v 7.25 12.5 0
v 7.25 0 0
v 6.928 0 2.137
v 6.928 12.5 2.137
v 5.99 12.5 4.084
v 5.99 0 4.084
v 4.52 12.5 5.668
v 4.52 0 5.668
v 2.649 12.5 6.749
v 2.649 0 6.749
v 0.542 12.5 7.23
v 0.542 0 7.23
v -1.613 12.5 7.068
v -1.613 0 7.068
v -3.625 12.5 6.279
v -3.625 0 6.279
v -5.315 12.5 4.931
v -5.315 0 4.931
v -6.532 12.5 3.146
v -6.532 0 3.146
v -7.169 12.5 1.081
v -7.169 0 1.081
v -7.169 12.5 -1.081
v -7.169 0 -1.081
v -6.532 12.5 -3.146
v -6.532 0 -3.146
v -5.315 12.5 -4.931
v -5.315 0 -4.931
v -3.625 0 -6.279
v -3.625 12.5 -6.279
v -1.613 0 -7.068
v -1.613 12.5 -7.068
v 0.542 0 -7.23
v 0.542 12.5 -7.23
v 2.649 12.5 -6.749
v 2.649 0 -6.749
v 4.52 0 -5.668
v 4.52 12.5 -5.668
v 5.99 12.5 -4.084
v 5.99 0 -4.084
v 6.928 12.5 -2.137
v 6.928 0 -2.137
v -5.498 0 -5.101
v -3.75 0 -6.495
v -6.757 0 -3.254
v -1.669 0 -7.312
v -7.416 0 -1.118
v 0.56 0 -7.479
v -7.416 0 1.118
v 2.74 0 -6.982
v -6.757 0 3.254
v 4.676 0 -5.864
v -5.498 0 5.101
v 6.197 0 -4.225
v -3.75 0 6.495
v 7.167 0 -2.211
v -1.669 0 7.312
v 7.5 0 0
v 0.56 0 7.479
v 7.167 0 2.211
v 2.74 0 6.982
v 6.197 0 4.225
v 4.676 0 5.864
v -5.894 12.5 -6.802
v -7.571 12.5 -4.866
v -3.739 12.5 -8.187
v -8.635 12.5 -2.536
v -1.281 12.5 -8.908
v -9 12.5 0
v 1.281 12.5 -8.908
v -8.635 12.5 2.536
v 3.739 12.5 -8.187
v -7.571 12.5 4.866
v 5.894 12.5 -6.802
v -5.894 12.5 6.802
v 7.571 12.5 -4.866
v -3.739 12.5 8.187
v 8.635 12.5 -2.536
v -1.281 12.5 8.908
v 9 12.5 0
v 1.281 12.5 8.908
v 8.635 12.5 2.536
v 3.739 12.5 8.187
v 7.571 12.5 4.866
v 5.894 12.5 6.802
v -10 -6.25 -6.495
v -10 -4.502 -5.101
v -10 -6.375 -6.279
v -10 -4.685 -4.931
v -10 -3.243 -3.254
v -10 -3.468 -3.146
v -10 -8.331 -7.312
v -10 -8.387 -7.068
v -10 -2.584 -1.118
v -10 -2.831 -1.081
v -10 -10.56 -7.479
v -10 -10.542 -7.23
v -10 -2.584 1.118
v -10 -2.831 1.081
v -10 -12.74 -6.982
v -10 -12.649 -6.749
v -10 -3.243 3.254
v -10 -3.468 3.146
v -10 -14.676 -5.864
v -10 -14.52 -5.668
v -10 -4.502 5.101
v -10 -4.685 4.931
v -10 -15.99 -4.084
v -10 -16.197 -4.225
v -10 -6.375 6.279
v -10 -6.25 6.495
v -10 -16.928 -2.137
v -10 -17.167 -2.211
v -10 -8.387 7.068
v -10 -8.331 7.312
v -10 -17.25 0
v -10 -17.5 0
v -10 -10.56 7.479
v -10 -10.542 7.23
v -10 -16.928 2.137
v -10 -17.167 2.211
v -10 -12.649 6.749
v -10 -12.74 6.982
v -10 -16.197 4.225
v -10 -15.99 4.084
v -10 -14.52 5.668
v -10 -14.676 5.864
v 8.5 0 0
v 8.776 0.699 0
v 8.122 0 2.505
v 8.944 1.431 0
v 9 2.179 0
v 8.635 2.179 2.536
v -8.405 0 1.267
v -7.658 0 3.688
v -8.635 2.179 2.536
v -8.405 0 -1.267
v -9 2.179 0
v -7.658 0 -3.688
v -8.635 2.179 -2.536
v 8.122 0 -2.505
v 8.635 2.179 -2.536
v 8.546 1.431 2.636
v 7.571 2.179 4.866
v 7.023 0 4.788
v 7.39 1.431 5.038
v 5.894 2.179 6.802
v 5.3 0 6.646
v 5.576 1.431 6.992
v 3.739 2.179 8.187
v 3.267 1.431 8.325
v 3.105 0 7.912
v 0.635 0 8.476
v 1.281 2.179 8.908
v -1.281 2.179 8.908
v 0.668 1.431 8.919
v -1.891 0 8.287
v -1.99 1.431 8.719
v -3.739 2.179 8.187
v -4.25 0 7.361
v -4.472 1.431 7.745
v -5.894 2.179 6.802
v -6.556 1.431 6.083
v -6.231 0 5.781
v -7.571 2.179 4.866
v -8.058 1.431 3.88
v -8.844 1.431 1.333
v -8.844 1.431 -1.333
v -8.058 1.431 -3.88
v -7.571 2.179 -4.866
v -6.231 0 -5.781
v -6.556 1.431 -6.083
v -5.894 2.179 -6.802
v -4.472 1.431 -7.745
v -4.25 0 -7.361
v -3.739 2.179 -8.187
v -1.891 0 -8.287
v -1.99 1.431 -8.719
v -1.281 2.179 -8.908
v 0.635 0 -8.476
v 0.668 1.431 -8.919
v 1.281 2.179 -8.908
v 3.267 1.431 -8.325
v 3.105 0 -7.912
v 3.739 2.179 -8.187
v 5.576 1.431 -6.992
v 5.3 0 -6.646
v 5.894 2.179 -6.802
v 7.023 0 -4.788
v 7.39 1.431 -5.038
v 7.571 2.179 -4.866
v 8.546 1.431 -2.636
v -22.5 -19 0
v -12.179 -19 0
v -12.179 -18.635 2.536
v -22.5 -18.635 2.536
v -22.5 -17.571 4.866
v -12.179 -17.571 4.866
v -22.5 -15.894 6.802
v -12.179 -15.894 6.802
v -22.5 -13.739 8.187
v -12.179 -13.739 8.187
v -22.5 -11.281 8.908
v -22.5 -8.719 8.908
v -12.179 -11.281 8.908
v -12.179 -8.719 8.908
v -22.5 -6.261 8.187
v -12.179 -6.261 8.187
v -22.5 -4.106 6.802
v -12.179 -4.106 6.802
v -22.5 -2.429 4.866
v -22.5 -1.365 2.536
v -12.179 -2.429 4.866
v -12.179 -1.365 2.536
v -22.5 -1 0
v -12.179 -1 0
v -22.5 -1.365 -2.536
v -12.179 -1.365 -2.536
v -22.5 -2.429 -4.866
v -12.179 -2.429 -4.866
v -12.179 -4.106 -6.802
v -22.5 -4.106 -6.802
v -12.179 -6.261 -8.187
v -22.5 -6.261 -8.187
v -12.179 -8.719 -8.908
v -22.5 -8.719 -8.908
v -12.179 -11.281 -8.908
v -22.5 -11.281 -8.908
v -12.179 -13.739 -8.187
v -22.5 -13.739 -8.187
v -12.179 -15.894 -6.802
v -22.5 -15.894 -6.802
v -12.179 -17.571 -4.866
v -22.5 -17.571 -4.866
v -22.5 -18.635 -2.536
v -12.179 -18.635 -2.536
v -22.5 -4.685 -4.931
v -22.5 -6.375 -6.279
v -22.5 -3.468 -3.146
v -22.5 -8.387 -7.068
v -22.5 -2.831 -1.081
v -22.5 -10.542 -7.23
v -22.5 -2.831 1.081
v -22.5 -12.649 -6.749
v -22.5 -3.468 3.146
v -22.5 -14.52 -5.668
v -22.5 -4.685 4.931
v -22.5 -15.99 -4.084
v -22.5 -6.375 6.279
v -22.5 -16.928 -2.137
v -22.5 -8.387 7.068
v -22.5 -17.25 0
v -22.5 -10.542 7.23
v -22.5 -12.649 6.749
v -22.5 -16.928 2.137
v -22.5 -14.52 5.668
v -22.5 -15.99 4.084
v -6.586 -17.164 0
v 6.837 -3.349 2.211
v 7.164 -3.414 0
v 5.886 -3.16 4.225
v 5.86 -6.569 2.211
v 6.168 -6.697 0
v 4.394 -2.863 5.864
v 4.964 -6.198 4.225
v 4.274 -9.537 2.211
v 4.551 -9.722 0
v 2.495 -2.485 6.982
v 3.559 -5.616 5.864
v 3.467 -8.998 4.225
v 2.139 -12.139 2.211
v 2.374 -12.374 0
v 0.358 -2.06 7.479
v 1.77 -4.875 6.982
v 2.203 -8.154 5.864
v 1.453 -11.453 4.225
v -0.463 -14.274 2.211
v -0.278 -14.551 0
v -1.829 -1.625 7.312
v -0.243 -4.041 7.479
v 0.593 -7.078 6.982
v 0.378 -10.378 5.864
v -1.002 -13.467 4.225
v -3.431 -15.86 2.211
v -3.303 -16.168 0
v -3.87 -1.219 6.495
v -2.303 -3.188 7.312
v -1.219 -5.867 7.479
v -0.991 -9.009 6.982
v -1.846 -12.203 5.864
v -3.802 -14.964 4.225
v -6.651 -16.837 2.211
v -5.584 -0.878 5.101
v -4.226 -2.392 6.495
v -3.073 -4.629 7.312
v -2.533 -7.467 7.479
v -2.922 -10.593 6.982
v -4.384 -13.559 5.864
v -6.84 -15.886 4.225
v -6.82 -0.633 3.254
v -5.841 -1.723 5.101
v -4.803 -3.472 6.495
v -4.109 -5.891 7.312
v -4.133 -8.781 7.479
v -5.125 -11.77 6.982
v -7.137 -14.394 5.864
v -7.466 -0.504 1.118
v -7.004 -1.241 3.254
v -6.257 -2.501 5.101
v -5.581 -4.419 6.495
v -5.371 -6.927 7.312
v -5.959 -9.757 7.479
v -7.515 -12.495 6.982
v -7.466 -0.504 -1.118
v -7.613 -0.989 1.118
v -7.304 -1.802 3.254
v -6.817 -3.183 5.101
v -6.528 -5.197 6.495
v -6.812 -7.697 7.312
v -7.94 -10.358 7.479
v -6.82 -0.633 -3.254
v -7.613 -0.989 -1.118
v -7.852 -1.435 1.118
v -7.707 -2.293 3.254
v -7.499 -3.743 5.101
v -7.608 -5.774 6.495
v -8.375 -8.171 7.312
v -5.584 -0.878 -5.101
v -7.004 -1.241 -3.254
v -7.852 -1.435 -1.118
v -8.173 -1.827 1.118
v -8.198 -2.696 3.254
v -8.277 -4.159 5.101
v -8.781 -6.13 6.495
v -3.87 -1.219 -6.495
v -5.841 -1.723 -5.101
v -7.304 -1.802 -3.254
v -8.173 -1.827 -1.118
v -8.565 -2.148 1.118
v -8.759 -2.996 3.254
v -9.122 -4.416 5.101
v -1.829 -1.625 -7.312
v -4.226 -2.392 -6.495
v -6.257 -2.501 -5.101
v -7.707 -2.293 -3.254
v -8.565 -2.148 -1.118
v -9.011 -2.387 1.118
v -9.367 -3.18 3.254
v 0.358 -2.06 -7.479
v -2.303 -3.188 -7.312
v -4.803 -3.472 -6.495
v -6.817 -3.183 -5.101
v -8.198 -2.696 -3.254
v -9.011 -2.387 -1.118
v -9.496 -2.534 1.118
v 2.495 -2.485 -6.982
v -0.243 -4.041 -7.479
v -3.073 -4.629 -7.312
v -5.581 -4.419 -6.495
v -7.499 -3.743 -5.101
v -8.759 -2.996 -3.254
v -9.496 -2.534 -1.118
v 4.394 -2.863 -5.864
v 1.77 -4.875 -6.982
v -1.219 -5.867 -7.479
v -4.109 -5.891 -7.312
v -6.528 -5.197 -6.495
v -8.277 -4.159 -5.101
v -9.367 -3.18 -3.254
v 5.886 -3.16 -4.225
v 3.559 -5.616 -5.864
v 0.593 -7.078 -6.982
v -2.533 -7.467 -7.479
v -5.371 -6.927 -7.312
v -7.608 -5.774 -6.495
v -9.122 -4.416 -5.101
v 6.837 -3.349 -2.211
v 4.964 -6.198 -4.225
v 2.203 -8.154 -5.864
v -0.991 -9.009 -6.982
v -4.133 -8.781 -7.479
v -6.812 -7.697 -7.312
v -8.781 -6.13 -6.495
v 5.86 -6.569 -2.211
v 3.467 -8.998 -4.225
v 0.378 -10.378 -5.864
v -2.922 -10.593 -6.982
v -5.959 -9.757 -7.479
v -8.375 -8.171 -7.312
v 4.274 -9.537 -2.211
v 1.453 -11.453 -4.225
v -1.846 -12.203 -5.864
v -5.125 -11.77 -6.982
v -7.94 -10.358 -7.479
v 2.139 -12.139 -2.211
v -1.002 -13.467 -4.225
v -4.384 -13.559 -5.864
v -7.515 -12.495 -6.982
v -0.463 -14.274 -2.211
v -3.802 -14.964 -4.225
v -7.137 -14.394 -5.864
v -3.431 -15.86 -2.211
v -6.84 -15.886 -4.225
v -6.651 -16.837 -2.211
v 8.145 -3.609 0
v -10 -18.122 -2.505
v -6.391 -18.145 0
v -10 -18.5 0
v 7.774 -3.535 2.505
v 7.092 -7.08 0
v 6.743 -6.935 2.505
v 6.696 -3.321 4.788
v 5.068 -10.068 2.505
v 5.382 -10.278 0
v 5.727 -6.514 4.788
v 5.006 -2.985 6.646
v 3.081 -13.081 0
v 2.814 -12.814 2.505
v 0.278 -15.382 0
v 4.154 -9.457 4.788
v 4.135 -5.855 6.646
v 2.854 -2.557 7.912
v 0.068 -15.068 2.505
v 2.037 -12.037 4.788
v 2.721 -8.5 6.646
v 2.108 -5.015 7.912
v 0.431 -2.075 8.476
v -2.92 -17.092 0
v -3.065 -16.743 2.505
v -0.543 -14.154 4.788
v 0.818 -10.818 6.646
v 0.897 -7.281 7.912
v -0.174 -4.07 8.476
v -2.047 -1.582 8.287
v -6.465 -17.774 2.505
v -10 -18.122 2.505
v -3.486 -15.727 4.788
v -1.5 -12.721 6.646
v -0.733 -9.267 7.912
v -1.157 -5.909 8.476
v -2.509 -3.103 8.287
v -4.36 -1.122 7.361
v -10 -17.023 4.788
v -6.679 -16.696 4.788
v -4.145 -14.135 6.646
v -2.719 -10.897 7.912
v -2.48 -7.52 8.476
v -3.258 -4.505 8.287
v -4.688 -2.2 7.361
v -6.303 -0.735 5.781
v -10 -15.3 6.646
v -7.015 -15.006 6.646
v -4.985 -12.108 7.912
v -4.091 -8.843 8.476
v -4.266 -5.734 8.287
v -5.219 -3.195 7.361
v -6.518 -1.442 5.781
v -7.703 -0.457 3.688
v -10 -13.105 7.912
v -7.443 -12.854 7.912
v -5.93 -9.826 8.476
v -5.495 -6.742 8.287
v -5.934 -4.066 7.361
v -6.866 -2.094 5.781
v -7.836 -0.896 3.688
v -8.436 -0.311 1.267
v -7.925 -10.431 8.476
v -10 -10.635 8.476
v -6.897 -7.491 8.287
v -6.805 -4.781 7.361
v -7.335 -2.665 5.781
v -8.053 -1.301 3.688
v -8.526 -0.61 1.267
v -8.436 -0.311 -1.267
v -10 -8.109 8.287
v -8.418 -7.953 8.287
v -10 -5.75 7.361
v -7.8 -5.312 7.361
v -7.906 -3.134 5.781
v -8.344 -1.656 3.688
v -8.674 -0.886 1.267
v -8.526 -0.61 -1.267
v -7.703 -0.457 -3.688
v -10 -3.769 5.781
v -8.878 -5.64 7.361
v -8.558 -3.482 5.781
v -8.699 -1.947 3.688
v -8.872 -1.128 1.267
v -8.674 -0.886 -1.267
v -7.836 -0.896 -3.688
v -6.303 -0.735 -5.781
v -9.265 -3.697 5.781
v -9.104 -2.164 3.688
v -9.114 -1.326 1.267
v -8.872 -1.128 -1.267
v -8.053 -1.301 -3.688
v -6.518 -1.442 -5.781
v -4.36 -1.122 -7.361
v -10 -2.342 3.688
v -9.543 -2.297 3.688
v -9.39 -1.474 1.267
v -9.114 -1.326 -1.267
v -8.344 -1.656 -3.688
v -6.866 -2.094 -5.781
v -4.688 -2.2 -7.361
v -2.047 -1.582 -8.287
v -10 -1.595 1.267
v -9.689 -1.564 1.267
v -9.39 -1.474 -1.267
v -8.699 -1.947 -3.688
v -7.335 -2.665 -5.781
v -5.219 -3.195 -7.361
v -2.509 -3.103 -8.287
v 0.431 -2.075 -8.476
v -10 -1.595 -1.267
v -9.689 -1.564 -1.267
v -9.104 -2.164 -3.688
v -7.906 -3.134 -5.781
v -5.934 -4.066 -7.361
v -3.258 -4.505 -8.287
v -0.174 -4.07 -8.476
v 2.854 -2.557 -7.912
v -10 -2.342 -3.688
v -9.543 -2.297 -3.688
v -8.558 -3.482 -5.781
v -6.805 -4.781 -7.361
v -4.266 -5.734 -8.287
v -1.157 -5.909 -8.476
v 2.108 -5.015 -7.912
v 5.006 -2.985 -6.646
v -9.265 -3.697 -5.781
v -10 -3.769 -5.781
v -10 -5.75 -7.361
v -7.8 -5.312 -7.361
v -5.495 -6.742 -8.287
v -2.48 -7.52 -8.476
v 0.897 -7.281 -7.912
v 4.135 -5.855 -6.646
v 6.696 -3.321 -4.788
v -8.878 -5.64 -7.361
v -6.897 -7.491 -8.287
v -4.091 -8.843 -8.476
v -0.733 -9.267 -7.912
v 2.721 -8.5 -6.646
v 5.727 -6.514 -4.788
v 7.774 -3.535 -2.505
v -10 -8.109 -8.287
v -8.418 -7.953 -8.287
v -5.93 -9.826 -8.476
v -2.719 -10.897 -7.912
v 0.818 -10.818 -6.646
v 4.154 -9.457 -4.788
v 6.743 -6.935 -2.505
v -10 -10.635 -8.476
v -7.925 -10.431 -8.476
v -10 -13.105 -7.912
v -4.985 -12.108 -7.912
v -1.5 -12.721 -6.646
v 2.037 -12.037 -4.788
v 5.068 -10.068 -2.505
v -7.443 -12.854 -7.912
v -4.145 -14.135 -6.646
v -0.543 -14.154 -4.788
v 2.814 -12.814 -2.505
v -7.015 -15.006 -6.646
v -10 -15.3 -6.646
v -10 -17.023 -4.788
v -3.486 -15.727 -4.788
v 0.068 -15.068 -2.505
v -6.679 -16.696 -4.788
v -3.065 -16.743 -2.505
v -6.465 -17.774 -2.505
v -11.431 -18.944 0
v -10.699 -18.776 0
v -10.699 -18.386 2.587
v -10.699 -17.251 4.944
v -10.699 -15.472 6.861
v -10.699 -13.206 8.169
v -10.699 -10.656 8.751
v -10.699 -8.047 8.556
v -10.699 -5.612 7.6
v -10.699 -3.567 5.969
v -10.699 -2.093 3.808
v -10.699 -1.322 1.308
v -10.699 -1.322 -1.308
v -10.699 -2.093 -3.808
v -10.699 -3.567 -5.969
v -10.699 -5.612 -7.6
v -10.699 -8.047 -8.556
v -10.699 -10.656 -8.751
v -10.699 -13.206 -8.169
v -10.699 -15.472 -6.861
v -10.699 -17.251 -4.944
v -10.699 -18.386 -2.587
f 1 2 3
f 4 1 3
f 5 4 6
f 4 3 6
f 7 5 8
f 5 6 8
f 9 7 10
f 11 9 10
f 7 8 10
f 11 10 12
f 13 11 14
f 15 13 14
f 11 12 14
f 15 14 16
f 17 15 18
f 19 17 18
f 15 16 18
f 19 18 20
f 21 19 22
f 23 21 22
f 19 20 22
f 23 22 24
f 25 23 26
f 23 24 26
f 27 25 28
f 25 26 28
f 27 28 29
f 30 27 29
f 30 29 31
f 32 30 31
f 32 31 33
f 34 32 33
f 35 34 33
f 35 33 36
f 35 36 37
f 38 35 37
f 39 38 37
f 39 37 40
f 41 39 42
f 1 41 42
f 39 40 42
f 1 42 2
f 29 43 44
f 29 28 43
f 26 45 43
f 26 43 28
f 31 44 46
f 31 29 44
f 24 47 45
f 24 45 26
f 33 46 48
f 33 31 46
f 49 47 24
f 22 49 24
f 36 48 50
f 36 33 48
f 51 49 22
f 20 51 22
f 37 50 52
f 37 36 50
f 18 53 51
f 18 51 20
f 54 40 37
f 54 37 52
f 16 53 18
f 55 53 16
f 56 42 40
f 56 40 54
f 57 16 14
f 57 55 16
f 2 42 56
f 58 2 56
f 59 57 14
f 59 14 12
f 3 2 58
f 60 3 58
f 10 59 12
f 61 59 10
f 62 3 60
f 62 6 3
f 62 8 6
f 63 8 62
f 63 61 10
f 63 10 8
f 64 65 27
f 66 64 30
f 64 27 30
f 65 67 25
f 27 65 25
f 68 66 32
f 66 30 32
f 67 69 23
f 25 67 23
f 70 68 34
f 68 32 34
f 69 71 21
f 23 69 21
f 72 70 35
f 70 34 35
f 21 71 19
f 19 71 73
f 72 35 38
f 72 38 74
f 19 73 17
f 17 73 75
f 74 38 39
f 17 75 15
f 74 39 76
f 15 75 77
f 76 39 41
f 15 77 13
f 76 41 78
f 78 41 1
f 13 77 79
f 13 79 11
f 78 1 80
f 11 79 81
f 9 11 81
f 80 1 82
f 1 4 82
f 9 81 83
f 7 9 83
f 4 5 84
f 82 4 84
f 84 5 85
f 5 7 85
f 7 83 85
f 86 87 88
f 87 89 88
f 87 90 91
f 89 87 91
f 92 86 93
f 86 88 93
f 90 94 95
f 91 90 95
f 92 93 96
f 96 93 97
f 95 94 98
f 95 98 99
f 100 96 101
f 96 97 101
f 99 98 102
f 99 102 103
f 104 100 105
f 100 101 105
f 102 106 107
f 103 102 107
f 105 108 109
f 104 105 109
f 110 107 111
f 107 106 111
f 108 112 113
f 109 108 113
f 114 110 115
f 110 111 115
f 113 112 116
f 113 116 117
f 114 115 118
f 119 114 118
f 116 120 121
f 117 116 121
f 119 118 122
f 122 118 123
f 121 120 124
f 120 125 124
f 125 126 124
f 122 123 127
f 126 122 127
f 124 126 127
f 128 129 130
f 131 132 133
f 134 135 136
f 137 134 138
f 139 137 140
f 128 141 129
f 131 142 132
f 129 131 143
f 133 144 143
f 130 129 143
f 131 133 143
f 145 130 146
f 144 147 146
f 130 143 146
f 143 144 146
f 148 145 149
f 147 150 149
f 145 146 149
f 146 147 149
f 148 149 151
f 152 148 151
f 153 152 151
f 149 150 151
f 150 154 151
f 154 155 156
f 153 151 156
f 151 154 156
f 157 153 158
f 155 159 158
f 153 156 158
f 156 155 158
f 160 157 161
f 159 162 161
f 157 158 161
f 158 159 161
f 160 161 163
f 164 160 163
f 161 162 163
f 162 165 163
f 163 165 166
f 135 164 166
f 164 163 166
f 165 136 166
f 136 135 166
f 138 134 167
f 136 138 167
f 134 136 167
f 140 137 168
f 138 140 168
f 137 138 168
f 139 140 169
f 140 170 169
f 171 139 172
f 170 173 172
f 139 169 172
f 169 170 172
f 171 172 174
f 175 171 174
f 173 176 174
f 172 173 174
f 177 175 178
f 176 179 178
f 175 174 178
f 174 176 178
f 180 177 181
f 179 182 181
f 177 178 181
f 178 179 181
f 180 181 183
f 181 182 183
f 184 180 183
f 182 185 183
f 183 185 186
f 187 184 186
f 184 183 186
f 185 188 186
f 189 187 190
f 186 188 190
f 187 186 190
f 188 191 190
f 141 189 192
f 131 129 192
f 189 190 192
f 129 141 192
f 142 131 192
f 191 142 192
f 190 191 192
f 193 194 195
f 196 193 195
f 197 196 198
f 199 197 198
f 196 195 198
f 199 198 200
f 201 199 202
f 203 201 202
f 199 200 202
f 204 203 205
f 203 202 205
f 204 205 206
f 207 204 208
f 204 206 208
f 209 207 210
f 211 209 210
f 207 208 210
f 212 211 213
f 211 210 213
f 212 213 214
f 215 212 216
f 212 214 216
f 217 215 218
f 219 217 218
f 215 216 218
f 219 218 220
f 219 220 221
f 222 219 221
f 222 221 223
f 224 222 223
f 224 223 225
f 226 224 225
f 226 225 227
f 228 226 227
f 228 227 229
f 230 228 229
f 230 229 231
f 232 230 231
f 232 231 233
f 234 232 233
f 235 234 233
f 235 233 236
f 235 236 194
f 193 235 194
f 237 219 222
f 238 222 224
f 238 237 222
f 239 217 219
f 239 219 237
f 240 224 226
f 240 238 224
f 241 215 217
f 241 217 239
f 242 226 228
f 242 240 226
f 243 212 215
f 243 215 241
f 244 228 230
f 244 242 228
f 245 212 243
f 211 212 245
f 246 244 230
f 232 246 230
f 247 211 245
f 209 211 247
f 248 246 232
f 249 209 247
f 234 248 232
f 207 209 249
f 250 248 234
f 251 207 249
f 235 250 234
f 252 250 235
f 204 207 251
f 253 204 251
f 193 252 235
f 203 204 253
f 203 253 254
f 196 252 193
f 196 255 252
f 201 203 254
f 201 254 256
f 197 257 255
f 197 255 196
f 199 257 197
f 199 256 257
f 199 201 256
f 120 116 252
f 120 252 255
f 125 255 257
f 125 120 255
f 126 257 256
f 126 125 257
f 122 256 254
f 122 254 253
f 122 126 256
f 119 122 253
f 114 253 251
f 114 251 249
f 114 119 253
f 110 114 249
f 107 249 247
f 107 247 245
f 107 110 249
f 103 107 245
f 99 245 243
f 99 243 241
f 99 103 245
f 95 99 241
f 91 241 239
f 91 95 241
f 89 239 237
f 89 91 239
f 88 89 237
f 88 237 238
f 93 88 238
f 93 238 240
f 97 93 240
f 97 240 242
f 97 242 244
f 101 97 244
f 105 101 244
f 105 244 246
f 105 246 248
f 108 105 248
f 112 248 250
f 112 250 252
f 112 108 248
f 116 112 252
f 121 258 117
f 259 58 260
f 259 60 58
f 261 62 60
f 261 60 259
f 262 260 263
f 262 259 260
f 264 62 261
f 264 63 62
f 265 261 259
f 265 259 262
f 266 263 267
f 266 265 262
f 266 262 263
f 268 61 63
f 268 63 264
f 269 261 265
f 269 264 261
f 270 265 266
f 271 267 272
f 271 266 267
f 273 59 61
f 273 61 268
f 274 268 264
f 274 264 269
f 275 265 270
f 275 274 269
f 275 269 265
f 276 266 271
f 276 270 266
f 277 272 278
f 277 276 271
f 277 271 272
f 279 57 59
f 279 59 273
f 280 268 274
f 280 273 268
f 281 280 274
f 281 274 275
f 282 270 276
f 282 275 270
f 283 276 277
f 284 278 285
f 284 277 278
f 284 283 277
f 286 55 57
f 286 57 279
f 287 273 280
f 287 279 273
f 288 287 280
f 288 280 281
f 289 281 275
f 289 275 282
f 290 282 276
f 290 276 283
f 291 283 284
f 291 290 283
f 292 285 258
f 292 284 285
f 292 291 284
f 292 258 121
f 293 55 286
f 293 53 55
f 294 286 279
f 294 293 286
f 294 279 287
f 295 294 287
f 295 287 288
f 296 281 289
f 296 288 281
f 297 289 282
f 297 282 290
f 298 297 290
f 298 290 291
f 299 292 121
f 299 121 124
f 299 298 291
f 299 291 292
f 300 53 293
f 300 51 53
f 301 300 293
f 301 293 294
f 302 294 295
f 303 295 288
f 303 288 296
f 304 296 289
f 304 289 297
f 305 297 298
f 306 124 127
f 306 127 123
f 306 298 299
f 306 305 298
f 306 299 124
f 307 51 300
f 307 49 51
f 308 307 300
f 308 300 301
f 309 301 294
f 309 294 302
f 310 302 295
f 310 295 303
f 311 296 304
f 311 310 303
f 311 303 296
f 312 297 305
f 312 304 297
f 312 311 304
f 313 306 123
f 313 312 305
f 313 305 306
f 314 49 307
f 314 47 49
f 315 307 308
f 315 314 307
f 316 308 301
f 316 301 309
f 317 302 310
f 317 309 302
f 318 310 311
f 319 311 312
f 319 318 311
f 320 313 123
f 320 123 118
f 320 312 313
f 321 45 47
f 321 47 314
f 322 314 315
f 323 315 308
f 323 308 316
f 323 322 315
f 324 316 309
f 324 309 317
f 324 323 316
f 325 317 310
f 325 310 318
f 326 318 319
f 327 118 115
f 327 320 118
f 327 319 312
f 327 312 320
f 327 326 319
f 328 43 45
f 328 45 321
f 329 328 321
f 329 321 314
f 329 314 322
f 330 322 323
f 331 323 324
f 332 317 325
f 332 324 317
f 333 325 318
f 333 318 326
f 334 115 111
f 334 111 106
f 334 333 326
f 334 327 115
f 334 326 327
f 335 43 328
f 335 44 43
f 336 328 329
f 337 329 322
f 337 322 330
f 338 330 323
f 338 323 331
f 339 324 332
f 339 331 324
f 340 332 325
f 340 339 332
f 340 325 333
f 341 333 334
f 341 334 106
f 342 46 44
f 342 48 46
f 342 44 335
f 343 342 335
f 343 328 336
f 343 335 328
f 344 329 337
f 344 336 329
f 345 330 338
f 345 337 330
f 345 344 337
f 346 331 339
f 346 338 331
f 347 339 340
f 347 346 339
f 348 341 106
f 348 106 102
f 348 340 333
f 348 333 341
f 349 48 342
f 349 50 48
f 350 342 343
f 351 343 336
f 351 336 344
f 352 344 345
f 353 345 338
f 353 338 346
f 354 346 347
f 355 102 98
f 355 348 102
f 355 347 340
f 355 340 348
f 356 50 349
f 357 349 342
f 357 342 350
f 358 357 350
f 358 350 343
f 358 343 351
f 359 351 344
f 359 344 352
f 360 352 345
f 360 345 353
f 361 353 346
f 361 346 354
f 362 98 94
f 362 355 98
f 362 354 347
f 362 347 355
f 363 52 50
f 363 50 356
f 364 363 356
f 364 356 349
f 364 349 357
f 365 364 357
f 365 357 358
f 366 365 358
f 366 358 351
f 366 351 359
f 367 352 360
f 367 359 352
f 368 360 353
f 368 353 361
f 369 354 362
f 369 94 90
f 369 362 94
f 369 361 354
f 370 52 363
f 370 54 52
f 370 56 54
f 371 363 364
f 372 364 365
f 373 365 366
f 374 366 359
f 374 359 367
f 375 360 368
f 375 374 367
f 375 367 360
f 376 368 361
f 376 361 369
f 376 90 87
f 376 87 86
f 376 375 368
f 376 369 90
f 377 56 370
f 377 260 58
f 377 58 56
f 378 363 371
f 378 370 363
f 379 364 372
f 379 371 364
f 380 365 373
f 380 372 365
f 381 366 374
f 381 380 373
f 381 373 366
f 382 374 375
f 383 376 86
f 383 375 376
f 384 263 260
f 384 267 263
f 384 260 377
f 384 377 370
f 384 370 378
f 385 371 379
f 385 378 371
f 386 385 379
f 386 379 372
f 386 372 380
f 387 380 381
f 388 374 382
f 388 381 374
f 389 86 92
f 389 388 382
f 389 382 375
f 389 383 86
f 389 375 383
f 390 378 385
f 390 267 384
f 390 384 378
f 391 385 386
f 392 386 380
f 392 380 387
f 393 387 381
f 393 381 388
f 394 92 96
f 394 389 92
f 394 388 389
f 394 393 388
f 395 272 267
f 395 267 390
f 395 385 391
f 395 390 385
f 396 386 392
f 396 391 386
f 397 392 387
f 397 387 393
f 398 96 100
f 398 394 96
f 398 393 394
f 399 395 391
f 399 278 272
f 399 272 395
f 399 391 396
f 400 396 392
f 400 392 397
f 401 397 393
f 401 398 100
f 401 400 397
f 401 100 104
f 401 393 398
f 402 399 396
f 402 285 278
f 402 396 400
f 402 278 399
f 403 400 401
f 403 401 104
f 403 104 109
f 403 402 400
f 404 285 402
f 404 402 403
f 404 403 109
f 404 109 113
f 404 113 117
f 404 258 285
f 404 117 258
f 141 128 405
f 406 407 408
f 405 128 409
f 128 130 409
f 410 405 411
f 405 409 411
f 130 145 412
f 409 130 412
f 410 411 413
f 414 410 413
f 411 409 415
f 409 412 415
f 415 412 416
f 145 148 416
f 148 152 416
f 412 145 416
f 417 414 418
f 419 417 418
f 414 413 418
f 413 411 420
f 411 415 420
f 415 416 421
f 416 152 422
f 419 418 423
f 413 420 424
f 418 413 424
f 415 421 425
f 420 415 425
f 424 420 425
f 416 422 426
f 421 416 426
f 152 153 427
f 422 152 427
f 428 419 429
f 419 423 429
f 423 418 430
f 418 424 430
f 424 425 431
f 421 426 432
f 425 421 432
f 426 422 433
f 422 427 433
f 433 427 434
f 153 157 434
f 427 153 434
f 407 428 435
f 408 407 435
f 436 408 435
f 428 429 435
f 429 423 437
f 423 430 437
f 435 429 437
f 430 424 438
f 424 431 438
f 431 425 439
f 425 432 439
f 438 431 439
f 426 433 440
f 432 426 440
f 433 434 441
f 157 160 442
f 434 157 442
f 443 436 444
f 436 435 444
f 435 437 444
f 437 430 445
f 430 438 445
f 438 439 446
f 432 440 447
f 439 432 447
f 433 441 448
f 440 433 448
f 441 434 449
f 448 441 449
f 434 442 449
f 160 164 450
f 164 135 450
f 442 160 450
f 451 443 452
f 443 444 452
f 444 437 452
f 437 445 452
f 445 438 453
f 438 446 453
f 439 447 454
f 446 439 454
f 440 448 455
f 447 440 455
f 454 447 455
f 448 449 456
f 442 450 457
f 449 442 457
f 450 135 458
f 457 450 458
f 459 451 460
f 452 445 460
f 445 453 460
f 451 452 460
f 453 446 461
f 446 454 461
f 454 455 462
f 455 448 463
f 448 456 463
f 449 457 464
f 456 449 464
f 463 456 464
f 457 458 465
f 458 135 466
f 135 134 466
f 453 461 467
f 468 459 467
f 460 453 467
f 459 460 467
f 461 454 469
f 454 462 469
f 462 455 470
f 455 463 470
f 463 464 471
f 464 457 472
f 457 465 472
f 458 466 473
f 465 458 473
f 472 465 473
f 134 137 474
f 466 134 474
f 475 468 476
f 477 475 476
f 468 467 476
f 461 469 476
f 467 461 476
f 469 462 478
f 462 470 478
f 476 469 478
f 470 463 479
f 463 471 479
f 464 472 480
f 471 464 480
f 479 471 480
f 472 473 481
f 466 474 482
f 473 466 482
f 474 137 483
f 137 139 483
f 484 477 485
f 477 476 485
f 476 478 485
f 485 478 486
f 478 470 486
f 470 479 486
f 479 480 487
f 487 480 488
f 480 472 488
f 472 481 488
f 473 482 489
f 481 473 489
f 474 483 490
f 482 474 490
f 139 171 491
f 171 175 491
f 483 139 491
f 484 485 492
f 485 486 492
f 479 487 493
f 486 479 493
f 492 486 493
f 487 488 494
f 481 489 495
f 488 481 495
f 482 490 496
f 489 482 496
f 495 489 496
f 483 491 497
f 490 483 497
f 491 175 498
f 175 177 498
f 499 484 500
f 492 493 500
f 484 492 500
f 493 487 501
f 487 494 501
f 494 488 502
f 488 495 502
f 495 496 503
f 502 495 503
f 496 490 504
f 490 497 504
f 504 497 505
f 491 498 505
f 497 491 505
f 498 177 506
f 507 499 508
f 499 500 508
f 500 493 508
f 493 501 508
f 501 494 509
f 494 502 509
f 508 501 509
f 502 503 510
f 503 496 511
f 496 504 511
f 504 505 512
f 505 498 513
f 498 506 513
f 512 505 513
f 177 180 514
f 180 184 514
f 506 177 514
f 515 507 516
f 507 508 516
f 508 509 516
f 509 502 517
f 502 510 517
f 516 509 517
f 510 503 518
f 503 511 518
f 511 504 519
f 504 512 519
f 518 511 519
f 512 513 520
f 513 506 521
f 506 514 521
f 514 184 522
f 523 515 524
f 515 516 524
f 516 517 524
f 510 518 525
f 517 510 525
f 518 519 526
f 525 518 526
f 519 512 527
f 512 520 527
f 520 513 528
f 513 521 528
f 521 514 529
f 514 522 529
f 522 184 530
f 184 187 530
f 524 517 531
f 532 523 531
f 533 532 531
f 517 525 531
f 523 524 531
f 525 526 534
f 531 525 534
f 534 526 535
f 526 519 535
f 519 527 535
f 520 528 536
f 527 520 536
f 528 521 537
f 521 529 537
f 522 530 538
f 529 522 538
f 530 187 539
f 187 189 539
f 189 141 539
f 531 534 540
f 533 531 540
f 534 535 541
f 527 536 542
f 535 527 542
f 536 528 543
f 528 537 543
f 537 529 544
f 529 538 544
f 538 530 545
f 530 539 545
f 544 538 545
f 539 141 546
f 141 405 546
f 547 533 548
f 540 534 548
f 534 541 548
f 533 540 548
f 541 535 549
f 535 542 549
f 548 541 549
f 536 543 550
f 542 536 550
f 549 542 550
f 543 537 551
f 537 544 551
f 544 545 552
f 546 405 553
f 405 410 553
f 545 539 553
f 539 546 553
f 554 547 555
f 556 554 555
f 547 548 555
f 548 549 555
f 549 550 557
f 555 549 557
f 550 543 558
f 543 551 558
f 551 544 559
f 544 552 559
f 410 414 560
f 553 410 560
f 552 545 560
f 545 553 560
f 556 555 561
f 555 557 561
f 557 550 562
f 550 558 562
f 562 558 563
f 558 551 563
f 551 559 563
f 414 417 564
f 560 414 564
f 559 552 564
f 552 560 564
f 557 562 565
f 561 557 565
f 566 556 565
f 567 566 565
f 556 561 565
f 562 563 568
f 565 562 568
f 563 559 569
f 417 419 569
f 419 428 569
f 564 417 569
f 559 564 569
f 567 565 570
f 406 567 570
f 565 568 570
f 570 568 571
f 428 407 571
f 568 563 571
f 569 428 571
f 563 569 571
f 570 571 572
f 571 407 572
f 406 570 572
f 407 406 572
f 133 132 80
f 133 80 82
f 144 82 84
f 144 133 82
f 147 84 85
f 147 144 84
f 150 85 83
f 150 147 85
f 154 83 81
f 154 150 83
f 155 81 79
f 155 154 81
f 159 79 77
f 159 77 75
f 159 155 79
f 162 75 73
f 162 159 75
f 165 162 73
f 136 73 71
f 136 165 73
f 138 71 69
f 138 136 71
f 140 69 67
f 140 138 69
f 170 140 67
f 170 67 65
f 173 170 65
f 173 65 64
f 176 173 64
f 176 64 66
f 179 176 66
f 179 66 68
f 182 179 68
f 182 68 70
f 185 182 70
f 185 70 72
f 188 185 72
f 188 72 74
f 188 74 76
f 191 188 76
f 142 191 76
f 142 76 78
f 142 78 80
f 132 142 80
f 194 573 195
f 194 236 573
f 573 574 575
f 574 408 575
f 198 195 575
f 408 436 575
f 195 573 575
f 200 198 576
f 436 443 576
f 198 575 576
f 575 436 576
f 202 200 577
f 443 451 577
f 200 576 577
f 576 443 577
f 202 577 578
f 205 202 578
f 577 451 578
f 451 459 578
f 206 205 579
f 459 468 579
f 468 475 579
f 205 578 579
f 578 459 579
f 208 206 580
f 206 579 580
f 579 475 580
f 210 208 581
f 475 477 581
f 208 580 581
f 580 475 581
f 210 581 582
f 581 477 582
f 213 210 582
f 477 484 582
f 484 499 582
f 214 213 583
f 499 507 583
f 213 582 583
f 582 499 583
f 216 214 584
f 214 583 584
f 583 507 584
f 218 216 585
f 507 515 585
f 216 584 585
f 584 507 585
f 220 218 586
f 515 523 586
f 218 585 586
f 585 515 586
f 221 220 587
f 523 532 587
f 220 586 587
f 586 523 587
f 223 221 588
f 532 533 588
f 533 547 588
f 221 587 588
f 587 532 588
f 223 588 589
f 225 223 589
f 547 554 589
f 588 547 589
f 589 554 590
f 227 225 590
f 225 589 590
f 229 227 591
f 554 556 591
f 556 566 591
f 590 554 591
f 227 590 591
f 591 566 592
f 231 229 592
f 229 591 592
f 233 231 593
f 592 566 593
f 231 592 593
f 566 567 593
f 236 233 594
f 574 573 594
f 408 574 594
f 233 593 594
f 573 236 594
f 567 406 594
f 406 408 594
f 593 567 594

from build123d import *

# Parameters (mm, degrees)
F0_R     = 8.5
F0_R_2   = 7.5
F1_ANGLE = 90
F2_R     = 9
F2_R_2   = 7.25
F3_DEPTH = 12.5
F4_R     = 9
F4_R_2   = 7.25
F5_DEPTH = 12.5


# Not quite as in the source:
# - a fillet or chamfer that OpenCascade refuses, or shapes differently, is made with other operations: its cross-section is extruded or revolved along the edge and cut away or added


with BuildPart() as f1:
    # F0 (on Front) → F1 (revolve)
    with BuildSketch(Plane.XZ):
        Circle(F0_R)
        Circle(F0_R_2, mode=Mode.SUBTRACT)
    revolve(axis=Axis((-10, 0, 0.1811354887), (0, 0, -1)), revolution_arc=F1_ANGLE)

    # F2 (on Front) → F3 (join)
    with BuildSketch(Plane.XZ):
        Circle(F2_R)
        Circle(F2_R_2, mode=Mode.SUBTRACT)
    extrude(amount=-F3_DEPTH)

    # F4 (on face) → F5 (join)
    with BuildSketch(Plane(origin=(-10, 0, 0), x_dir=(0, -1, 0), z_dir=(-1, 0, 0))):
        with Locations((10, 0)):
            Circle(F4_R)
        with Locations((10, 0)):
            Circle(F4_R_2, mode=Mode.SUBTRACT)
    extrude(amount=F5_DEPTH)

    # F6: fillet of radius 5 on 2 edges, made by hand

    # F6_s1 → F6_t2 (revolve, cut)
    with BuildSketch(Plane.XY):
        with BuildLine():
            ThreePointArc((-12.1794494718, -19), (-11.061415483, -18.8733971724), (-10, -18.5))
            Line((-10, -18.5), (-10, -19))
            Line((-10, -19), (-12.1794494718, -19))
        make_face()
    revolve(axis=Axis((-10, -10, 0), (-1, 0, 0)), mode=Mode.SUBTRACT)

    # F6_s3 → F6_t4 (revolve, cut)
    with BuildSketch(Plane.XY):
        with BuildLine():
            ThreePointArc((8.5, 0), (8.8733971724, 1.061415483), (9, 2.1794494718))
            Line((9, 2.1794494718), (9, 0))
            Line((9, 0), (8.5, 0))
        make_face()
    revolve(axis=Axis((0, 0, 0), (0, -1, 0)), mode=Mode.SUBTRACT)


solid = f1.part
